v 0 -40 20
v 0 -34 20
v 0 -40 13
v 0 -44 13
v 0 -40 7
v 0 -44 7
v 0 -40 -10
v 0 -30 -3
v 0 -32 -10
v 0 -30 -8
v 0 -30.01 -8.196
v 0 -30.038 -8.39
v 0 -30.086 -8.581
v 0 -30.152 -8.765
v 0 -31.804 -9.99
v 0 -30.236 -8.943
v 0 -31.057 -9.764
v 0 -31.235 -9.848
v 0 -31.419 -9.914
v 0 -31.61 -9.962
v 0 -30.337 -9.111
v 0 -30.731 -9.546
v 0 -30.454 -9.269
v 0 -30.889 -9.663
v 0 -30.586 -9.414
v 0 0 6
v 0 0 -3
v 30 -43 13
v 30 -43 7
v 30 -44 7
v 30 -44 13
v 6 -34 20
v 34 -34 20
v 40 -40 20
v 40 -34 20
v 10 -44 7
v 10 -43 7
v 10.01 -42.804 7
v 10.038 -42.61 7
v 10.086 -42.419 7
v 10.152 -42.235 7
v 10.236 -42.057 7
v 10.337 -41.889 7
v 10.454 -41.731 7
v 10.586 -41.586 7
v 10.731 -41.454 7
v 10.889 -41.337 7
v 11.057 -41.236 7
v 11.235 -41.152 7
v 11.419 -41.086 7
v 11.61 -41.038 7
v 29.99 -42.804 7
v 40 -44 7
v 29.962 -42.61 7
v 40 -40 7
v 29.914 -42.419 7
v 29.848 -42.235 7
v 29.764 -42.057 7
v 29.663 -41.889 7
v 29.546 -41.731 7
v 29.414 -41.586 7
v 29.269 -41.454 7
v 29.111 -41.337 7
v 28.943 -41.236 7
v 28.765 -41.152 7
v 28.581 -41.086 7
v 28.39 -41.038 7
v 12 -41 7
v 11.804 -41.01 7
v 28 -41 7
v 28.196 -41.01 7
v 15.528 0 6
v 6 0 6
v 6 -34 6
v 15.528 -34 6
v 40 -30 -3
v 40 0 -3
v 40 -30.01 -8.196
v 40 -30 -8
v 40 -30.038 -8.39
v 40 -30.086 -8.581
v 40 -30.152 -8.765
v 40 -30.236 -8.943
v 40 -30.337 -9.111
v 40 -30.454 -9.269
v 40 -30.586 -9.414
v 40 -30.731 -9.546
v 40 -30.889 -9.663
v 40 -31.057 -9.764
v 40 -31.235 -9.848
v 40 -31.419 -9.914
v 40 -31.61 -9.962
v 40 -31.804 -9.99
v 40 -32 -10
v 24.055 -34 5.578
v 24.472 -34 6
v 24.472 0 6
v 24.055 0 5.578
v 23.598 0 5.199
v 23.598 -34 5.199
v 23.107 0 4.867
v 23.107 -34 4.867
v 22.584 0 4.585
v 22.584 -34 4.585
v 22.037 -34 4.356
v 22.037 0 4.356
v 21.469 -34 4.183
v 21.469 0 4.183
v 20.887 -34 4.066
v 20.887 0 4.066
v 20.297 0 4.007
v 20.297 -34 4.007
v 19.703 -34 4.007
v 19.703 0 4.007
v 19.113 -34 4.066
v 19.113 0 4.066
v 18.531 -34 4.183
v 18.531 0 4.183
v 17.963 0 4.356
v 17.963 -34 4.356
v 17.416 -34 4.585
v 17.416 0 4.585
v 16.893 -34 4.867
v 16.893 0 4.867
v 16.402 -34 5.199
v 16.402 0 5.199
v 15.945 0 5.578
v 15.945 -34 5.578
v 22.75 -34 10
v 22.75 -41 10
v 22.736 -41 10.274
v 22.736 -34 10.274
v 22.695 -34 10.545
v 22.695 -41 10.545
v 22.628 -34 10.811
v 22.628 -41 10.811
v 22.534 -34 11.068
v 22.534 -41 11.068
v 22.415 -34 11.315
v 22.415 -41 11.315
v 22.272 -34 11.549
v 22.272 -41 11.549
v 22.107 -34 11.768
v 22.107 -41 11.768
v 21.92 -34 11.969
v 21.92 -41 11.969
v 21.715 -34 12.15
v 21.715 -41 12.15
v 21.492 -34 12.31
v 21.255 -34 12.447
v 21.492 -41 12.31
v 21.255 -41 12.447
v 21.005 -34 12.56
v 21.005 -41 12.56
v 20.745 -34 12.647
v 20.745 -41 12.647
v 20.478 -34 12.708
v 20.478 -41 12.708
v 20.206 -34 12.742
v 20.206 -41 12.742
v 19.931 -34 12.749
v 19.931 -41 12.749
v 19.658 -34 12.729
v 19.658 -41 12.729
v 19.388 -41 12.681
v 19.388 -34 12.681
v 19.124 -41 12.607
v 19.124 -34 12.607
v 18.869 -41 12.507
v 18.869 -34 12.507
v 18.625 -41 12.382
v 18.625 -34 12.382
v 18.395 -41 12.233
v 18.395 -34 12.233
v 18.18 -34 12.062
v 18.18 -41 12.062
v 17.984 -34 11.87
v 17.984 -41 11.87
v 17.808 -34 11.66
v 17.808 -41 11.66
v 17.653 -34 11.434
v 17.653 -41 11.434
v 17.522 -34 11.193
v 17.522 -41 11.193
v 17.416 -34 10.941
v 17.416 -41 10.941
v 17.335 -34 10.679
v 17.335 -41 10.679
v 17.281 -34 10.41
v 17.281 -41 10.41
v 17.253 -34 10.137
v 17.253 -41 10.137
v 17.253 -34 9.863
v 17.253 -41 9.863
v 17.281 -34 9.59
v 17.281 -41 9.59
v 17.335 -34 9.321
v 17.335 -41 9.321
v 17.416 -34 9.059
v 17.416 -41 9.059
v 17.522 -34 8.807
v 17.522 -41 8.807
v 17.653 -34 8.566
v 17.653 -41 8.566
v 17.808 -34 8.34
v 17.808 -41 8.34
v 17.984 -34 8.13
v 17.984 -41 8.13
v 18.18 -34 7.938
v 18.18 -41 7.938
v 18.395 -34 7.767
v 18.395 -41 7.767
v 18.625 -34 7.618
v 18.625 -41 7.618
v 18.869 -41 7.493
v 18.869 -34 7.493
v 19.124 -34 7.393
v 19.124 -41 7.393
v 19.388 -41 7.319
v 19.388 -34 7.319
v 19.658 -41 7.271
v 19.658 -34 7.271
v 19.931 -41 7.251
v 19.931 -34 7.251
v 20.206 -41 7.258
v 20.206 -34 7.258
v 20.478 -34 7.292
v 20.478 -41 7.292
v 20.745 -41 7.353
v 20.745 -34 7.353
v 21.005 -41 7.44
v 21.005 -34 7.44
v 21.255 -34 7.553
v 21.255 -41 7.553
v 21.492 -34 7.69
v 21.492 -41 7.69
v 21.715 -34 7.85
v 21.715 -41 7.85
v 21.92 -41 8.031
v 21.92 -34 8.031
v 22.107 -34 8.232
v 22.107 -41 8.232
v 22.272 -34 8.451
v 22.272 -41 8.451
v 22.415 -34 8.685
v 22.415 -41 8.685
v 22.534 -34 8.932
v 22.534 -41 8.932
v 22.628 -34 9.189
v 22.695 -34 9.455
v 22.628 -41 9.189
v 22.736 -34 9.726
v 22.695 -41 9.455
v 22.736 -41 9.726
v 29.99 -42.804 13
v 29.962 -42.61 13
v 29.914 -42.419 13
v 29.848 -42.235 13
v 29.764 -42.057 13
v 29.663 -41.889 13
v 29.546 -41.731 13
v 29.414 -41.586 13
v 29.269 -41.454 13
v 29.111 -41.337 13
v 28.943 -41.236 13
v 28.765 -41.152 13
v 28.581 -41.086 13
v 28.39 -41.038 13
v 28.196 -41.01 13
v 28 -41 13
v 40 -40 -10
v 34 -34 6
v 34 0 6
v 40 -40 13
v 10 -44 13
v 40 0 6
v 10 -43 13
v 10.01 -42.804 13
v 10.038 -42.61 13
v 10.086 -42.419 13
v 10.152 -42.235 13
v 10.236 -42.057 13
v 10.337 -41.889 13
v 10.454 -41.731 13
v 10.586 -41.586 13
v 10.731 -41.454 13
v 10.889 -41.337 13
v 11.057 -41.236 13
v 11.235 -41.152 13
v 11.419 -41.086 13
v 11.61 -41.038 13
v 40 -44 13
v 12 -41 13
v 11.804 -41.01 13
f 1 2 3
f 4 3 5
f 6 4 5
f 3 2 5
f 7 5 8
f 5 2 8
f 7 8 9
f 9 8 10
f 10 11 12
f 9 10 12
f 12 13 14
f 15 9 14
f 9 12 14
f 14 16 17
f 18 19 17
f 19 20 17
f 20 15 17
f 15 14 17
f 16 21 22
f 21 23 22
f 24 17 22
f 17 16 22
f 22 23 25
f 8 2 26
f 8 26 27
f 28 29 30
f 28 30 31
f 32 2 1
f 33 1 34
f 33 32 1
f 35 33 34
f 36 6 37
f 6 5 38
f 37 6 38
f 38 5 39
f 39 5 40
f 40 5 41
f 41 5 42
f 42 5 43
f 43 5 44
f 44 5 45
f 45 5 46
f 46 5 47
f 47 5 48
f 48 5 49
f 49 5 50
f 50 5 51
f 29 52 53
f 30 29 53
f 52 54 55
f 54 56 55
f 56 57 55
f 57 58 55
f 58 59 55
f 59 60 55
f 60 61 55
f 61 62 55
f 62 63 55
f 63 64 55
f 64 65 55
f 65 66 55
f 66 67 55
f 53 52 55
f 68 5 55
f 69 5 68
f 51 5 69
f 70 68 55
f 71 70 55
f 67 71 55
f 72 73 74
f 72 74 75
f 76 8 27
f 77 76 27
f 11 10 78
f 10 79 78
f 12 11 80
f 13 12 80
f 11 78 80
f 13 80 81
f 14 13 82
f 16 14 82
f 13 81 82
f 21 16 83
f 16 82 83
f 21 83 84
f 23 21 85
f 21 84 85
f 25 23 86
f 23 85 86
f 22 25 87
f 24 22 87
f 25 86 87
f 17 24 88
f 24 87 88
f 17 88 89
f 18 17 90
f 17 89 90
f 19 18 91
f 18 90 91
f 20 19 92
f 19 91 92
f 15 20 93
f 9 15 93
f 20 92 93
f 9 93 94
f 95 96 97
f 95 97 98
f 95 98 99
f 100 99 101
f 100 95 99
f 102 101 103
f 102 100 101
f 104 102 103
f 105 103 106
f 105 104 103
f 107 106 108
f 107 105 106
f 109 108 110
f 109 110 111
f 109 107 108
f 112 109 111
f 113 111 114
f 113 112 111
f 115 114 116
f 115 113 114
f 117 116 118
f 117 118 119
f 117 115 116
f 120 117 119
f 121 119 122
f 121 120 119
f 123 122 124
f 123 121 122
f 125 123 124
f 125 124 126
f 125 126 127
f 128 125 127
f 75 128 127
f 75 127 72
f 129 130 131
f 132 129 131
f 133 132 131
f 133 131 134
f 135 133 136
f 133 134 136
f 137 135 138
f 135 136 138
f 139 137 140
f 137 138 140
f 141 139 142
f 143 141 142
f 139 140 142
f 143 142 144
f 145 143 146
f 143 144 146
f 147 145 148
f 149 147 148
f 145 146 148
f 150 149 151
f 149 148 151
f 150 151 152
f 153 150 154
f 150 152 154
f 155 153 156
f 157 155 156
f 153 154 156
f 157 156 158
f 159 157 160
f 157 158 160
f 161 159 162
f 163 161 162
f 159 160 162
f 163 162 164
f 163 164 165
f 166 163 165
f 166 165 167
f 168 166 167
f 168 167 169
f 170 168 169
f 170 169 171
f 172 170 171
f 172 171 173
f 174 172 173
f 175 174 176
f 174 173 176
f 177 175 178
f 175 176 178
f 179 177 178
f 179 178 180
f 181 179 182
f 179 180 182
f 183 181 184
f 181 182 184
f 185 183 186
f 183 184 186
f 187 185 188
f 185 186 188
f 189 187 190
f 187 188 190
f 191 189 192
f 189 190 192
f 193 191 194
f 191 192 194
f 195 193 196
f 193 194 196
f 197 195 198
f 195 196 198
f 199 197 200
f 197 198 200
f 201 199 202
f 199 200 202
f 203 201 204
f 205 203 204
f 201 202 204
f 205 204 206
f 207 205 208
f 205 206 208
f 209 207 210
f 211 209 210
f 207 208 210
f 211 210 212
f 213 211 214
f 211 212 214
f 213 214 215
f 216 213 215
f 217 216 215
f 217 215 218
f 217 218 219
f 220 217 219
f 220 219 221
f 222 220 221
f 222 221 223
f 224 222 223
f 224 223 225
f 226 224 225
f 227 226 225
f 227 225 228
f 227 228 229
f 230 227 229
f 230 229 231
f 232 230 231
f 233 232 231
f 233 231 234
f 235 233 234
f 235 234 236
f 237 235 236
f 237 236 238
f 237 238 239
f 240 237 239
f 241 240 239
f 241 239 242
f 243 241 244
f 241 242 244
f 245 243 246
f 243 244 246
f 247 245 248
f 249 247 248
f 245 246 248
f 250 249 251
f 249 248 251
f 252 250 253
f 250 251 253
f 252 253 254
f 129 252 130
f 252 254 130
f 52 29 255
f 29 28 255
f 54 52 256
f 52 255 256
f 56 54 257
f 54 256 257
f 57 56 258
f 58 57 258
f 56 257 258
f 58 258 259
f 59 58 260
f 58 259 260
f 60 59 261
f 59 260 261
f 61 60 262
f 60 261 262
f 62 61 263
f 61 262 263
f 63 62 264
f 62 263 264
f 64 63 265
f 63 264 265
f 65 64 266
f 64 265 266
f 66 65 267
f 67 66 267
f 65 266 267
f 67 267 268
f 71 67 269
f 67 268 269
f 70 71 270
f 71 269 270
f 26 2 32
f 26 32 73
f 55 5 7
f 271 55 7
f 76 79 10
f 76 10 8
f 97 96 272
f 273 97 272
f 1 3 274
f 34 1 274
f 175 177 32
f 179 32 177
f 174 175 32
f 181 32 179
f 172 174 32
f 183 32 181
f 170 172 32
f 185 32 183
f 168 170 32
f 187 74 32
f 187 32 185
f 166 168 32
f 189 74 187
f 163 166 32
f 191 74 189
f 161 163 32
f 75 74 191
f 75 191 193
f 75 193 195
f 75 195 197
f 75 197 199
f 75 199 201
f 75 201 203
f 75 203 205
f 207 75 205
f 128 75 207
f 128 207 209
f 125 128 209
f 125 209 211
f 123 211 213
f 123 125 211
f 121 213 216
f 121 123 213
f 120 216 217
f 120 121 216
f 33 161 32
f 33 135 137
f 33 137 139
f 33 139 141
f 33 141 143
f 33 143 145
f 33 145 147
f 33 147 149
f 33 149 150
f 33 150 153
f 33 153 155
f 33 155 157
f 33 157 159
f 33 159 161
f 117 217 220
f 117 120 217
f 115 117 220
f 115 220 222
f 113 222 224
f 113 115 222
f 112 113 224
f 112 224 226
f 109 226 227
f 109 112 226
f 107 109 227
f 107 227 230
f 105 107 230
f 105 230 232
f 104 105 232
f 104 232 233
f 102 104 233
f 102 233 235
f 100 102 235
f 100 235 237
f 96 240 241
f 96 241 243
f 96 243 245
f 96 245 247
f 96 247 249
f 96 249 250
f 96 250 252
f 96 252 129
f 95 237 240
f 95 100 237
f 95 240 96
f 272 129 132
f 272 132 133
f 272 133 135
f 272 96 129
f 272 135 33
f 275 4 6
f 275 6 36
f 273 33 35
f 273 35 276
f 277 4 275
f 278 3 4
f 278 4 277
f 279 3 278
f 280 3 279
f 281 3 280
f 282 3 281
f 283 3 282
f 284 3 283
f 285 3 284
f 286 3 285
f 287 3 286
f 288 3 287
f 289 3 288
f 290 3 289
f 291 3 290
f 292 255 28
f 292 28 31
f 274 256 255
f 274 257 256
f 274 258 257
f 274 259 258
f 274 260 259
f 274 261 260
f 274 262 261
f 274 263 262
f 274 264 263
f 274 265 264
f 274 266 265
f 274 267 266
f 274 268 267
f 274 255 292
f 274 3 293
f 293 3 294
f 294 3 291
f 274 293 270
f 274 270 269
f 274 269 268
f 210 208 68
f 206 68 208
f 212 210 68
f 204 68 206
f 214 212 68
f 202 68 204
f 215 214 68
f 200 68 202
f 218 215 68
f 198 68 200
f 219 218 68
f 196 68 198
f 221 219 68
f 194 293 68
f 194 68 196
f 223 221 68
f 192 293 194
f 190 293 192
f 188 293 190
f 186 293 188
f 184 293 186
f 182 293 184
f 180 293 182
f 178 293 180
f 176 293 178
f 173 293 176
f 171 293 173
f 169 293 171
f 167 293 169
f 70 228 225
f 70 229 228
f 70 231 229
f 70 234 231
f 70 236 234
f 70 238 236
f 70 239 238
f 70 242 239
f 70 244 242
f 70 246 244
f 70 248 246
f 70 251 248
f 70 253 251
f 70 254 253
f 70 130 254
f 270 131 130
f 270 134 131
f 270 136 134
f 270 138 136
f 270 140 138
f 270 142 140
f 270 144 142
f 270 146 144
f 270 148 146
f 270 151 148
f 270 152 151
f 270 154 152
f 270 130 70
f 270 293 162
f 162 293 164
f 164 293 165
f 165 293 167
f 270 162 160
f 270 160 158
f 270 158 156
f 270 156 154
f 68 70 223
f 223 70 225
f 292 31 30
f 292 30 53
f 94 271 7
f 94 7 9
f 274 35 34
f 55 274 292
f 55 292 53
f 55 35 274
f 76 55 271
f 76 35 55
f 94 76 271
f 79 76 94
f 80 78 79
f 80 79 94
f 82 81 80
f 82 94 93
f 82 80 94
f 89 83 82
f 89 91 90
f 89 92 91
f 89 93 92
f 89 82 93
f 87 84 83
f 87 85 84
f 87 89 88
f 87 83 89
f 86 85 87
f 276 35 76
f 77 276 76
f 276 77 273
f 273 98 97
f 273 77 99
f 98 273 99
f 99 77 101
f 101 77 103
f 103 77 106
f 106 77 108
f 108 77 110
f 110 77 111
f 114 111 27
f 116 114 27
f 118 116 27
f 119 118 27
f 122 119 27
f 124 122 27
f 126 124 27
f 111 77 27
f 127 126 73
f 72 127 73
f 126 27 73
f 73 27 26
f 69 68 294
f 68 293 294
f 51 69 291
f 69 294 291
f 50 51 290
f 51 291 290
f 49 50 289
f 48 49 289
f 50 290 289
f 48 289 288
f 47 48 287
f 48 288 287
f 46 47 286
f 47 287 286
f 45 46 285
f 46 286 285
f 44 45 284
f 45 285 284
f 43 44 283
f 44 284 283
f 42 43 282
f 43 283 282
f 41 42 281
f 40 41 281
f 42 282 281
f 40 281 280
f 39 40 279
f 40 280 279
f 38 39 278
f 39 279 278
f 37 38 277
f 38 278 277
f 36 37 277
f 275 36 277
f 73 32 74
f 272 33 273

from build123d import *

# Parameters (mm, degrees)
CROQUIS1_W              = 40
CROQUIS1_H              = 40
SALIENTE_EXTRUIR1_DEPTH = 20
CROQUIS2_W              = 28
CROQUIS2_H              = 14
CORTAR_EXTRUIR1_DEPTH   = 34
CORTAR_EXTRUIR2_DEPTH   = 40
CROQUIS7_W              = 40
CROQUIS7_H              = 6
SALIENTE_EXTRUIR2_DEPTH = 1
CROQUIS8_R              = 2.75
CORTAR_EXTRUIR6_DEPTH   = 7
CROQUIS9_R              = 6
CORTAR_EXTRUIR7_DEPTH   = 34
CROQUIS10_W             = 10
CROQUIS10_H             = 6
SALIENTE_EXTRUIR3_DEPTH = 3
REDONDEO1_R             = 2
SALIENTE_EXTRUIR5_DEPTH = 40
REDONDEO2_R             = 2


with BuildPart() as part:
    # Croquis1 → Saliente-Extruir1 (new body)
    with BuildSketch(Plane.XY):
        with Locations((20, -20)):
            Rectangle(CROQUIS1_W, CROQUIS1_H)
    extrude(amount=SALIENTE_EXTRUIR1_DEPTH)

    # Croquis2 → Cortar-Extruir1 (cut)
    with BuildSketch(Plane(origin=(0, 0, 0), x_dir=(1, 0, 0), z_dir=(0, 1, 0))):
        with Locations((20, -13)):
            Rectangle(CROQUIS2_W, CROQUIS2_H)
    extrude(amount=-CORTAR_EXTRUIR1_DEPTH, mode=Mode.SUBTRACT)

    # Croquis3 → Cortar-Extruir2 (cut)
    with BuildSketch(Plane.ZY):
        Polygon((20, 0), (20, -34), (6, 0), align=None)
    extrude(amount=-CORTAR_EXTRUIR2_DEPTH, mode=Mode.SUBTRACT)

    # Croquis7 → Saliente-Extruir2 (add)
    with BuildSketch(Plane.XZ.offset(40)):
        with Locations((20, 10)):
            Rectangle(CROQUIS7_W, CROQUIS7_H)
    extrude(amount=SALIENTE_EXTRUIR2_DEPTH)

    # Croquis8 → Cortar-Extruir6 (cut)
    with BuildSketch(Plane.XZ.offset(41)):
        with Locations((20, 10)):
            Circle(CROQUIS8_R)
    extrude(amount=-CORTAR_EXTRUIR6_DEPTH, mode=Mode.SUBTRACT)

    # Croquis9 → Cortar-Extruir7 (cut)
    with BuildSketch(Plane(origin=(0, -34, 0), x_dir=(1, 0, 0), z_dir=(0, 1, 0))):
        with Locations((20, -10)):
            Circle(CROQUIS9_R)
    extrude(amount=CORTAR_EXTRUIR7_DEPTH, mode=Mode.SUBTRACT)

    # Croquis10 → Saliente-Extruir3 (add)
    with BuildSketch(Plane.XZ.offset(41)):
        with Locations((5, 10)):
            Rectangle(CROQUIS10_W, CROQUIS10_H)
        with Locations((35, 10)):
            Rectangle(CROQUIS10_W, CROQUIS10_H)
    extrude(amount=SALIENTE_EXTRUIR3_DEPTH)

    # Redondeo1
    redondeo1_edges = [part.edges().sort_by_distance(p)[0] for p in [
        (10, -41, 10),
        (30, -41, 10),
    ]]
    fillet(redondeo1_edges, radius=REDONDEO1_R)

    # Croquis12 → Saliente-Extruir5 (add)
    with BuildSketch(Plane.ZY):
        Polygon((0, -40), (-10, -40), (-10, -30), (-3, -30), (-3, 0), (0, 0), align=None)
    extrude(amount=-SALIENTE_EXTRUIR5_DEPTH)

    # Redondeo2
    redondeo2_edges = [part.edges().sort_by_distance(p)[0] for p in [
        (20, -30, -10),
    ]]
    fillet(redondeo2_edges, radius=REDONDEO2_R)


solid = part.part
